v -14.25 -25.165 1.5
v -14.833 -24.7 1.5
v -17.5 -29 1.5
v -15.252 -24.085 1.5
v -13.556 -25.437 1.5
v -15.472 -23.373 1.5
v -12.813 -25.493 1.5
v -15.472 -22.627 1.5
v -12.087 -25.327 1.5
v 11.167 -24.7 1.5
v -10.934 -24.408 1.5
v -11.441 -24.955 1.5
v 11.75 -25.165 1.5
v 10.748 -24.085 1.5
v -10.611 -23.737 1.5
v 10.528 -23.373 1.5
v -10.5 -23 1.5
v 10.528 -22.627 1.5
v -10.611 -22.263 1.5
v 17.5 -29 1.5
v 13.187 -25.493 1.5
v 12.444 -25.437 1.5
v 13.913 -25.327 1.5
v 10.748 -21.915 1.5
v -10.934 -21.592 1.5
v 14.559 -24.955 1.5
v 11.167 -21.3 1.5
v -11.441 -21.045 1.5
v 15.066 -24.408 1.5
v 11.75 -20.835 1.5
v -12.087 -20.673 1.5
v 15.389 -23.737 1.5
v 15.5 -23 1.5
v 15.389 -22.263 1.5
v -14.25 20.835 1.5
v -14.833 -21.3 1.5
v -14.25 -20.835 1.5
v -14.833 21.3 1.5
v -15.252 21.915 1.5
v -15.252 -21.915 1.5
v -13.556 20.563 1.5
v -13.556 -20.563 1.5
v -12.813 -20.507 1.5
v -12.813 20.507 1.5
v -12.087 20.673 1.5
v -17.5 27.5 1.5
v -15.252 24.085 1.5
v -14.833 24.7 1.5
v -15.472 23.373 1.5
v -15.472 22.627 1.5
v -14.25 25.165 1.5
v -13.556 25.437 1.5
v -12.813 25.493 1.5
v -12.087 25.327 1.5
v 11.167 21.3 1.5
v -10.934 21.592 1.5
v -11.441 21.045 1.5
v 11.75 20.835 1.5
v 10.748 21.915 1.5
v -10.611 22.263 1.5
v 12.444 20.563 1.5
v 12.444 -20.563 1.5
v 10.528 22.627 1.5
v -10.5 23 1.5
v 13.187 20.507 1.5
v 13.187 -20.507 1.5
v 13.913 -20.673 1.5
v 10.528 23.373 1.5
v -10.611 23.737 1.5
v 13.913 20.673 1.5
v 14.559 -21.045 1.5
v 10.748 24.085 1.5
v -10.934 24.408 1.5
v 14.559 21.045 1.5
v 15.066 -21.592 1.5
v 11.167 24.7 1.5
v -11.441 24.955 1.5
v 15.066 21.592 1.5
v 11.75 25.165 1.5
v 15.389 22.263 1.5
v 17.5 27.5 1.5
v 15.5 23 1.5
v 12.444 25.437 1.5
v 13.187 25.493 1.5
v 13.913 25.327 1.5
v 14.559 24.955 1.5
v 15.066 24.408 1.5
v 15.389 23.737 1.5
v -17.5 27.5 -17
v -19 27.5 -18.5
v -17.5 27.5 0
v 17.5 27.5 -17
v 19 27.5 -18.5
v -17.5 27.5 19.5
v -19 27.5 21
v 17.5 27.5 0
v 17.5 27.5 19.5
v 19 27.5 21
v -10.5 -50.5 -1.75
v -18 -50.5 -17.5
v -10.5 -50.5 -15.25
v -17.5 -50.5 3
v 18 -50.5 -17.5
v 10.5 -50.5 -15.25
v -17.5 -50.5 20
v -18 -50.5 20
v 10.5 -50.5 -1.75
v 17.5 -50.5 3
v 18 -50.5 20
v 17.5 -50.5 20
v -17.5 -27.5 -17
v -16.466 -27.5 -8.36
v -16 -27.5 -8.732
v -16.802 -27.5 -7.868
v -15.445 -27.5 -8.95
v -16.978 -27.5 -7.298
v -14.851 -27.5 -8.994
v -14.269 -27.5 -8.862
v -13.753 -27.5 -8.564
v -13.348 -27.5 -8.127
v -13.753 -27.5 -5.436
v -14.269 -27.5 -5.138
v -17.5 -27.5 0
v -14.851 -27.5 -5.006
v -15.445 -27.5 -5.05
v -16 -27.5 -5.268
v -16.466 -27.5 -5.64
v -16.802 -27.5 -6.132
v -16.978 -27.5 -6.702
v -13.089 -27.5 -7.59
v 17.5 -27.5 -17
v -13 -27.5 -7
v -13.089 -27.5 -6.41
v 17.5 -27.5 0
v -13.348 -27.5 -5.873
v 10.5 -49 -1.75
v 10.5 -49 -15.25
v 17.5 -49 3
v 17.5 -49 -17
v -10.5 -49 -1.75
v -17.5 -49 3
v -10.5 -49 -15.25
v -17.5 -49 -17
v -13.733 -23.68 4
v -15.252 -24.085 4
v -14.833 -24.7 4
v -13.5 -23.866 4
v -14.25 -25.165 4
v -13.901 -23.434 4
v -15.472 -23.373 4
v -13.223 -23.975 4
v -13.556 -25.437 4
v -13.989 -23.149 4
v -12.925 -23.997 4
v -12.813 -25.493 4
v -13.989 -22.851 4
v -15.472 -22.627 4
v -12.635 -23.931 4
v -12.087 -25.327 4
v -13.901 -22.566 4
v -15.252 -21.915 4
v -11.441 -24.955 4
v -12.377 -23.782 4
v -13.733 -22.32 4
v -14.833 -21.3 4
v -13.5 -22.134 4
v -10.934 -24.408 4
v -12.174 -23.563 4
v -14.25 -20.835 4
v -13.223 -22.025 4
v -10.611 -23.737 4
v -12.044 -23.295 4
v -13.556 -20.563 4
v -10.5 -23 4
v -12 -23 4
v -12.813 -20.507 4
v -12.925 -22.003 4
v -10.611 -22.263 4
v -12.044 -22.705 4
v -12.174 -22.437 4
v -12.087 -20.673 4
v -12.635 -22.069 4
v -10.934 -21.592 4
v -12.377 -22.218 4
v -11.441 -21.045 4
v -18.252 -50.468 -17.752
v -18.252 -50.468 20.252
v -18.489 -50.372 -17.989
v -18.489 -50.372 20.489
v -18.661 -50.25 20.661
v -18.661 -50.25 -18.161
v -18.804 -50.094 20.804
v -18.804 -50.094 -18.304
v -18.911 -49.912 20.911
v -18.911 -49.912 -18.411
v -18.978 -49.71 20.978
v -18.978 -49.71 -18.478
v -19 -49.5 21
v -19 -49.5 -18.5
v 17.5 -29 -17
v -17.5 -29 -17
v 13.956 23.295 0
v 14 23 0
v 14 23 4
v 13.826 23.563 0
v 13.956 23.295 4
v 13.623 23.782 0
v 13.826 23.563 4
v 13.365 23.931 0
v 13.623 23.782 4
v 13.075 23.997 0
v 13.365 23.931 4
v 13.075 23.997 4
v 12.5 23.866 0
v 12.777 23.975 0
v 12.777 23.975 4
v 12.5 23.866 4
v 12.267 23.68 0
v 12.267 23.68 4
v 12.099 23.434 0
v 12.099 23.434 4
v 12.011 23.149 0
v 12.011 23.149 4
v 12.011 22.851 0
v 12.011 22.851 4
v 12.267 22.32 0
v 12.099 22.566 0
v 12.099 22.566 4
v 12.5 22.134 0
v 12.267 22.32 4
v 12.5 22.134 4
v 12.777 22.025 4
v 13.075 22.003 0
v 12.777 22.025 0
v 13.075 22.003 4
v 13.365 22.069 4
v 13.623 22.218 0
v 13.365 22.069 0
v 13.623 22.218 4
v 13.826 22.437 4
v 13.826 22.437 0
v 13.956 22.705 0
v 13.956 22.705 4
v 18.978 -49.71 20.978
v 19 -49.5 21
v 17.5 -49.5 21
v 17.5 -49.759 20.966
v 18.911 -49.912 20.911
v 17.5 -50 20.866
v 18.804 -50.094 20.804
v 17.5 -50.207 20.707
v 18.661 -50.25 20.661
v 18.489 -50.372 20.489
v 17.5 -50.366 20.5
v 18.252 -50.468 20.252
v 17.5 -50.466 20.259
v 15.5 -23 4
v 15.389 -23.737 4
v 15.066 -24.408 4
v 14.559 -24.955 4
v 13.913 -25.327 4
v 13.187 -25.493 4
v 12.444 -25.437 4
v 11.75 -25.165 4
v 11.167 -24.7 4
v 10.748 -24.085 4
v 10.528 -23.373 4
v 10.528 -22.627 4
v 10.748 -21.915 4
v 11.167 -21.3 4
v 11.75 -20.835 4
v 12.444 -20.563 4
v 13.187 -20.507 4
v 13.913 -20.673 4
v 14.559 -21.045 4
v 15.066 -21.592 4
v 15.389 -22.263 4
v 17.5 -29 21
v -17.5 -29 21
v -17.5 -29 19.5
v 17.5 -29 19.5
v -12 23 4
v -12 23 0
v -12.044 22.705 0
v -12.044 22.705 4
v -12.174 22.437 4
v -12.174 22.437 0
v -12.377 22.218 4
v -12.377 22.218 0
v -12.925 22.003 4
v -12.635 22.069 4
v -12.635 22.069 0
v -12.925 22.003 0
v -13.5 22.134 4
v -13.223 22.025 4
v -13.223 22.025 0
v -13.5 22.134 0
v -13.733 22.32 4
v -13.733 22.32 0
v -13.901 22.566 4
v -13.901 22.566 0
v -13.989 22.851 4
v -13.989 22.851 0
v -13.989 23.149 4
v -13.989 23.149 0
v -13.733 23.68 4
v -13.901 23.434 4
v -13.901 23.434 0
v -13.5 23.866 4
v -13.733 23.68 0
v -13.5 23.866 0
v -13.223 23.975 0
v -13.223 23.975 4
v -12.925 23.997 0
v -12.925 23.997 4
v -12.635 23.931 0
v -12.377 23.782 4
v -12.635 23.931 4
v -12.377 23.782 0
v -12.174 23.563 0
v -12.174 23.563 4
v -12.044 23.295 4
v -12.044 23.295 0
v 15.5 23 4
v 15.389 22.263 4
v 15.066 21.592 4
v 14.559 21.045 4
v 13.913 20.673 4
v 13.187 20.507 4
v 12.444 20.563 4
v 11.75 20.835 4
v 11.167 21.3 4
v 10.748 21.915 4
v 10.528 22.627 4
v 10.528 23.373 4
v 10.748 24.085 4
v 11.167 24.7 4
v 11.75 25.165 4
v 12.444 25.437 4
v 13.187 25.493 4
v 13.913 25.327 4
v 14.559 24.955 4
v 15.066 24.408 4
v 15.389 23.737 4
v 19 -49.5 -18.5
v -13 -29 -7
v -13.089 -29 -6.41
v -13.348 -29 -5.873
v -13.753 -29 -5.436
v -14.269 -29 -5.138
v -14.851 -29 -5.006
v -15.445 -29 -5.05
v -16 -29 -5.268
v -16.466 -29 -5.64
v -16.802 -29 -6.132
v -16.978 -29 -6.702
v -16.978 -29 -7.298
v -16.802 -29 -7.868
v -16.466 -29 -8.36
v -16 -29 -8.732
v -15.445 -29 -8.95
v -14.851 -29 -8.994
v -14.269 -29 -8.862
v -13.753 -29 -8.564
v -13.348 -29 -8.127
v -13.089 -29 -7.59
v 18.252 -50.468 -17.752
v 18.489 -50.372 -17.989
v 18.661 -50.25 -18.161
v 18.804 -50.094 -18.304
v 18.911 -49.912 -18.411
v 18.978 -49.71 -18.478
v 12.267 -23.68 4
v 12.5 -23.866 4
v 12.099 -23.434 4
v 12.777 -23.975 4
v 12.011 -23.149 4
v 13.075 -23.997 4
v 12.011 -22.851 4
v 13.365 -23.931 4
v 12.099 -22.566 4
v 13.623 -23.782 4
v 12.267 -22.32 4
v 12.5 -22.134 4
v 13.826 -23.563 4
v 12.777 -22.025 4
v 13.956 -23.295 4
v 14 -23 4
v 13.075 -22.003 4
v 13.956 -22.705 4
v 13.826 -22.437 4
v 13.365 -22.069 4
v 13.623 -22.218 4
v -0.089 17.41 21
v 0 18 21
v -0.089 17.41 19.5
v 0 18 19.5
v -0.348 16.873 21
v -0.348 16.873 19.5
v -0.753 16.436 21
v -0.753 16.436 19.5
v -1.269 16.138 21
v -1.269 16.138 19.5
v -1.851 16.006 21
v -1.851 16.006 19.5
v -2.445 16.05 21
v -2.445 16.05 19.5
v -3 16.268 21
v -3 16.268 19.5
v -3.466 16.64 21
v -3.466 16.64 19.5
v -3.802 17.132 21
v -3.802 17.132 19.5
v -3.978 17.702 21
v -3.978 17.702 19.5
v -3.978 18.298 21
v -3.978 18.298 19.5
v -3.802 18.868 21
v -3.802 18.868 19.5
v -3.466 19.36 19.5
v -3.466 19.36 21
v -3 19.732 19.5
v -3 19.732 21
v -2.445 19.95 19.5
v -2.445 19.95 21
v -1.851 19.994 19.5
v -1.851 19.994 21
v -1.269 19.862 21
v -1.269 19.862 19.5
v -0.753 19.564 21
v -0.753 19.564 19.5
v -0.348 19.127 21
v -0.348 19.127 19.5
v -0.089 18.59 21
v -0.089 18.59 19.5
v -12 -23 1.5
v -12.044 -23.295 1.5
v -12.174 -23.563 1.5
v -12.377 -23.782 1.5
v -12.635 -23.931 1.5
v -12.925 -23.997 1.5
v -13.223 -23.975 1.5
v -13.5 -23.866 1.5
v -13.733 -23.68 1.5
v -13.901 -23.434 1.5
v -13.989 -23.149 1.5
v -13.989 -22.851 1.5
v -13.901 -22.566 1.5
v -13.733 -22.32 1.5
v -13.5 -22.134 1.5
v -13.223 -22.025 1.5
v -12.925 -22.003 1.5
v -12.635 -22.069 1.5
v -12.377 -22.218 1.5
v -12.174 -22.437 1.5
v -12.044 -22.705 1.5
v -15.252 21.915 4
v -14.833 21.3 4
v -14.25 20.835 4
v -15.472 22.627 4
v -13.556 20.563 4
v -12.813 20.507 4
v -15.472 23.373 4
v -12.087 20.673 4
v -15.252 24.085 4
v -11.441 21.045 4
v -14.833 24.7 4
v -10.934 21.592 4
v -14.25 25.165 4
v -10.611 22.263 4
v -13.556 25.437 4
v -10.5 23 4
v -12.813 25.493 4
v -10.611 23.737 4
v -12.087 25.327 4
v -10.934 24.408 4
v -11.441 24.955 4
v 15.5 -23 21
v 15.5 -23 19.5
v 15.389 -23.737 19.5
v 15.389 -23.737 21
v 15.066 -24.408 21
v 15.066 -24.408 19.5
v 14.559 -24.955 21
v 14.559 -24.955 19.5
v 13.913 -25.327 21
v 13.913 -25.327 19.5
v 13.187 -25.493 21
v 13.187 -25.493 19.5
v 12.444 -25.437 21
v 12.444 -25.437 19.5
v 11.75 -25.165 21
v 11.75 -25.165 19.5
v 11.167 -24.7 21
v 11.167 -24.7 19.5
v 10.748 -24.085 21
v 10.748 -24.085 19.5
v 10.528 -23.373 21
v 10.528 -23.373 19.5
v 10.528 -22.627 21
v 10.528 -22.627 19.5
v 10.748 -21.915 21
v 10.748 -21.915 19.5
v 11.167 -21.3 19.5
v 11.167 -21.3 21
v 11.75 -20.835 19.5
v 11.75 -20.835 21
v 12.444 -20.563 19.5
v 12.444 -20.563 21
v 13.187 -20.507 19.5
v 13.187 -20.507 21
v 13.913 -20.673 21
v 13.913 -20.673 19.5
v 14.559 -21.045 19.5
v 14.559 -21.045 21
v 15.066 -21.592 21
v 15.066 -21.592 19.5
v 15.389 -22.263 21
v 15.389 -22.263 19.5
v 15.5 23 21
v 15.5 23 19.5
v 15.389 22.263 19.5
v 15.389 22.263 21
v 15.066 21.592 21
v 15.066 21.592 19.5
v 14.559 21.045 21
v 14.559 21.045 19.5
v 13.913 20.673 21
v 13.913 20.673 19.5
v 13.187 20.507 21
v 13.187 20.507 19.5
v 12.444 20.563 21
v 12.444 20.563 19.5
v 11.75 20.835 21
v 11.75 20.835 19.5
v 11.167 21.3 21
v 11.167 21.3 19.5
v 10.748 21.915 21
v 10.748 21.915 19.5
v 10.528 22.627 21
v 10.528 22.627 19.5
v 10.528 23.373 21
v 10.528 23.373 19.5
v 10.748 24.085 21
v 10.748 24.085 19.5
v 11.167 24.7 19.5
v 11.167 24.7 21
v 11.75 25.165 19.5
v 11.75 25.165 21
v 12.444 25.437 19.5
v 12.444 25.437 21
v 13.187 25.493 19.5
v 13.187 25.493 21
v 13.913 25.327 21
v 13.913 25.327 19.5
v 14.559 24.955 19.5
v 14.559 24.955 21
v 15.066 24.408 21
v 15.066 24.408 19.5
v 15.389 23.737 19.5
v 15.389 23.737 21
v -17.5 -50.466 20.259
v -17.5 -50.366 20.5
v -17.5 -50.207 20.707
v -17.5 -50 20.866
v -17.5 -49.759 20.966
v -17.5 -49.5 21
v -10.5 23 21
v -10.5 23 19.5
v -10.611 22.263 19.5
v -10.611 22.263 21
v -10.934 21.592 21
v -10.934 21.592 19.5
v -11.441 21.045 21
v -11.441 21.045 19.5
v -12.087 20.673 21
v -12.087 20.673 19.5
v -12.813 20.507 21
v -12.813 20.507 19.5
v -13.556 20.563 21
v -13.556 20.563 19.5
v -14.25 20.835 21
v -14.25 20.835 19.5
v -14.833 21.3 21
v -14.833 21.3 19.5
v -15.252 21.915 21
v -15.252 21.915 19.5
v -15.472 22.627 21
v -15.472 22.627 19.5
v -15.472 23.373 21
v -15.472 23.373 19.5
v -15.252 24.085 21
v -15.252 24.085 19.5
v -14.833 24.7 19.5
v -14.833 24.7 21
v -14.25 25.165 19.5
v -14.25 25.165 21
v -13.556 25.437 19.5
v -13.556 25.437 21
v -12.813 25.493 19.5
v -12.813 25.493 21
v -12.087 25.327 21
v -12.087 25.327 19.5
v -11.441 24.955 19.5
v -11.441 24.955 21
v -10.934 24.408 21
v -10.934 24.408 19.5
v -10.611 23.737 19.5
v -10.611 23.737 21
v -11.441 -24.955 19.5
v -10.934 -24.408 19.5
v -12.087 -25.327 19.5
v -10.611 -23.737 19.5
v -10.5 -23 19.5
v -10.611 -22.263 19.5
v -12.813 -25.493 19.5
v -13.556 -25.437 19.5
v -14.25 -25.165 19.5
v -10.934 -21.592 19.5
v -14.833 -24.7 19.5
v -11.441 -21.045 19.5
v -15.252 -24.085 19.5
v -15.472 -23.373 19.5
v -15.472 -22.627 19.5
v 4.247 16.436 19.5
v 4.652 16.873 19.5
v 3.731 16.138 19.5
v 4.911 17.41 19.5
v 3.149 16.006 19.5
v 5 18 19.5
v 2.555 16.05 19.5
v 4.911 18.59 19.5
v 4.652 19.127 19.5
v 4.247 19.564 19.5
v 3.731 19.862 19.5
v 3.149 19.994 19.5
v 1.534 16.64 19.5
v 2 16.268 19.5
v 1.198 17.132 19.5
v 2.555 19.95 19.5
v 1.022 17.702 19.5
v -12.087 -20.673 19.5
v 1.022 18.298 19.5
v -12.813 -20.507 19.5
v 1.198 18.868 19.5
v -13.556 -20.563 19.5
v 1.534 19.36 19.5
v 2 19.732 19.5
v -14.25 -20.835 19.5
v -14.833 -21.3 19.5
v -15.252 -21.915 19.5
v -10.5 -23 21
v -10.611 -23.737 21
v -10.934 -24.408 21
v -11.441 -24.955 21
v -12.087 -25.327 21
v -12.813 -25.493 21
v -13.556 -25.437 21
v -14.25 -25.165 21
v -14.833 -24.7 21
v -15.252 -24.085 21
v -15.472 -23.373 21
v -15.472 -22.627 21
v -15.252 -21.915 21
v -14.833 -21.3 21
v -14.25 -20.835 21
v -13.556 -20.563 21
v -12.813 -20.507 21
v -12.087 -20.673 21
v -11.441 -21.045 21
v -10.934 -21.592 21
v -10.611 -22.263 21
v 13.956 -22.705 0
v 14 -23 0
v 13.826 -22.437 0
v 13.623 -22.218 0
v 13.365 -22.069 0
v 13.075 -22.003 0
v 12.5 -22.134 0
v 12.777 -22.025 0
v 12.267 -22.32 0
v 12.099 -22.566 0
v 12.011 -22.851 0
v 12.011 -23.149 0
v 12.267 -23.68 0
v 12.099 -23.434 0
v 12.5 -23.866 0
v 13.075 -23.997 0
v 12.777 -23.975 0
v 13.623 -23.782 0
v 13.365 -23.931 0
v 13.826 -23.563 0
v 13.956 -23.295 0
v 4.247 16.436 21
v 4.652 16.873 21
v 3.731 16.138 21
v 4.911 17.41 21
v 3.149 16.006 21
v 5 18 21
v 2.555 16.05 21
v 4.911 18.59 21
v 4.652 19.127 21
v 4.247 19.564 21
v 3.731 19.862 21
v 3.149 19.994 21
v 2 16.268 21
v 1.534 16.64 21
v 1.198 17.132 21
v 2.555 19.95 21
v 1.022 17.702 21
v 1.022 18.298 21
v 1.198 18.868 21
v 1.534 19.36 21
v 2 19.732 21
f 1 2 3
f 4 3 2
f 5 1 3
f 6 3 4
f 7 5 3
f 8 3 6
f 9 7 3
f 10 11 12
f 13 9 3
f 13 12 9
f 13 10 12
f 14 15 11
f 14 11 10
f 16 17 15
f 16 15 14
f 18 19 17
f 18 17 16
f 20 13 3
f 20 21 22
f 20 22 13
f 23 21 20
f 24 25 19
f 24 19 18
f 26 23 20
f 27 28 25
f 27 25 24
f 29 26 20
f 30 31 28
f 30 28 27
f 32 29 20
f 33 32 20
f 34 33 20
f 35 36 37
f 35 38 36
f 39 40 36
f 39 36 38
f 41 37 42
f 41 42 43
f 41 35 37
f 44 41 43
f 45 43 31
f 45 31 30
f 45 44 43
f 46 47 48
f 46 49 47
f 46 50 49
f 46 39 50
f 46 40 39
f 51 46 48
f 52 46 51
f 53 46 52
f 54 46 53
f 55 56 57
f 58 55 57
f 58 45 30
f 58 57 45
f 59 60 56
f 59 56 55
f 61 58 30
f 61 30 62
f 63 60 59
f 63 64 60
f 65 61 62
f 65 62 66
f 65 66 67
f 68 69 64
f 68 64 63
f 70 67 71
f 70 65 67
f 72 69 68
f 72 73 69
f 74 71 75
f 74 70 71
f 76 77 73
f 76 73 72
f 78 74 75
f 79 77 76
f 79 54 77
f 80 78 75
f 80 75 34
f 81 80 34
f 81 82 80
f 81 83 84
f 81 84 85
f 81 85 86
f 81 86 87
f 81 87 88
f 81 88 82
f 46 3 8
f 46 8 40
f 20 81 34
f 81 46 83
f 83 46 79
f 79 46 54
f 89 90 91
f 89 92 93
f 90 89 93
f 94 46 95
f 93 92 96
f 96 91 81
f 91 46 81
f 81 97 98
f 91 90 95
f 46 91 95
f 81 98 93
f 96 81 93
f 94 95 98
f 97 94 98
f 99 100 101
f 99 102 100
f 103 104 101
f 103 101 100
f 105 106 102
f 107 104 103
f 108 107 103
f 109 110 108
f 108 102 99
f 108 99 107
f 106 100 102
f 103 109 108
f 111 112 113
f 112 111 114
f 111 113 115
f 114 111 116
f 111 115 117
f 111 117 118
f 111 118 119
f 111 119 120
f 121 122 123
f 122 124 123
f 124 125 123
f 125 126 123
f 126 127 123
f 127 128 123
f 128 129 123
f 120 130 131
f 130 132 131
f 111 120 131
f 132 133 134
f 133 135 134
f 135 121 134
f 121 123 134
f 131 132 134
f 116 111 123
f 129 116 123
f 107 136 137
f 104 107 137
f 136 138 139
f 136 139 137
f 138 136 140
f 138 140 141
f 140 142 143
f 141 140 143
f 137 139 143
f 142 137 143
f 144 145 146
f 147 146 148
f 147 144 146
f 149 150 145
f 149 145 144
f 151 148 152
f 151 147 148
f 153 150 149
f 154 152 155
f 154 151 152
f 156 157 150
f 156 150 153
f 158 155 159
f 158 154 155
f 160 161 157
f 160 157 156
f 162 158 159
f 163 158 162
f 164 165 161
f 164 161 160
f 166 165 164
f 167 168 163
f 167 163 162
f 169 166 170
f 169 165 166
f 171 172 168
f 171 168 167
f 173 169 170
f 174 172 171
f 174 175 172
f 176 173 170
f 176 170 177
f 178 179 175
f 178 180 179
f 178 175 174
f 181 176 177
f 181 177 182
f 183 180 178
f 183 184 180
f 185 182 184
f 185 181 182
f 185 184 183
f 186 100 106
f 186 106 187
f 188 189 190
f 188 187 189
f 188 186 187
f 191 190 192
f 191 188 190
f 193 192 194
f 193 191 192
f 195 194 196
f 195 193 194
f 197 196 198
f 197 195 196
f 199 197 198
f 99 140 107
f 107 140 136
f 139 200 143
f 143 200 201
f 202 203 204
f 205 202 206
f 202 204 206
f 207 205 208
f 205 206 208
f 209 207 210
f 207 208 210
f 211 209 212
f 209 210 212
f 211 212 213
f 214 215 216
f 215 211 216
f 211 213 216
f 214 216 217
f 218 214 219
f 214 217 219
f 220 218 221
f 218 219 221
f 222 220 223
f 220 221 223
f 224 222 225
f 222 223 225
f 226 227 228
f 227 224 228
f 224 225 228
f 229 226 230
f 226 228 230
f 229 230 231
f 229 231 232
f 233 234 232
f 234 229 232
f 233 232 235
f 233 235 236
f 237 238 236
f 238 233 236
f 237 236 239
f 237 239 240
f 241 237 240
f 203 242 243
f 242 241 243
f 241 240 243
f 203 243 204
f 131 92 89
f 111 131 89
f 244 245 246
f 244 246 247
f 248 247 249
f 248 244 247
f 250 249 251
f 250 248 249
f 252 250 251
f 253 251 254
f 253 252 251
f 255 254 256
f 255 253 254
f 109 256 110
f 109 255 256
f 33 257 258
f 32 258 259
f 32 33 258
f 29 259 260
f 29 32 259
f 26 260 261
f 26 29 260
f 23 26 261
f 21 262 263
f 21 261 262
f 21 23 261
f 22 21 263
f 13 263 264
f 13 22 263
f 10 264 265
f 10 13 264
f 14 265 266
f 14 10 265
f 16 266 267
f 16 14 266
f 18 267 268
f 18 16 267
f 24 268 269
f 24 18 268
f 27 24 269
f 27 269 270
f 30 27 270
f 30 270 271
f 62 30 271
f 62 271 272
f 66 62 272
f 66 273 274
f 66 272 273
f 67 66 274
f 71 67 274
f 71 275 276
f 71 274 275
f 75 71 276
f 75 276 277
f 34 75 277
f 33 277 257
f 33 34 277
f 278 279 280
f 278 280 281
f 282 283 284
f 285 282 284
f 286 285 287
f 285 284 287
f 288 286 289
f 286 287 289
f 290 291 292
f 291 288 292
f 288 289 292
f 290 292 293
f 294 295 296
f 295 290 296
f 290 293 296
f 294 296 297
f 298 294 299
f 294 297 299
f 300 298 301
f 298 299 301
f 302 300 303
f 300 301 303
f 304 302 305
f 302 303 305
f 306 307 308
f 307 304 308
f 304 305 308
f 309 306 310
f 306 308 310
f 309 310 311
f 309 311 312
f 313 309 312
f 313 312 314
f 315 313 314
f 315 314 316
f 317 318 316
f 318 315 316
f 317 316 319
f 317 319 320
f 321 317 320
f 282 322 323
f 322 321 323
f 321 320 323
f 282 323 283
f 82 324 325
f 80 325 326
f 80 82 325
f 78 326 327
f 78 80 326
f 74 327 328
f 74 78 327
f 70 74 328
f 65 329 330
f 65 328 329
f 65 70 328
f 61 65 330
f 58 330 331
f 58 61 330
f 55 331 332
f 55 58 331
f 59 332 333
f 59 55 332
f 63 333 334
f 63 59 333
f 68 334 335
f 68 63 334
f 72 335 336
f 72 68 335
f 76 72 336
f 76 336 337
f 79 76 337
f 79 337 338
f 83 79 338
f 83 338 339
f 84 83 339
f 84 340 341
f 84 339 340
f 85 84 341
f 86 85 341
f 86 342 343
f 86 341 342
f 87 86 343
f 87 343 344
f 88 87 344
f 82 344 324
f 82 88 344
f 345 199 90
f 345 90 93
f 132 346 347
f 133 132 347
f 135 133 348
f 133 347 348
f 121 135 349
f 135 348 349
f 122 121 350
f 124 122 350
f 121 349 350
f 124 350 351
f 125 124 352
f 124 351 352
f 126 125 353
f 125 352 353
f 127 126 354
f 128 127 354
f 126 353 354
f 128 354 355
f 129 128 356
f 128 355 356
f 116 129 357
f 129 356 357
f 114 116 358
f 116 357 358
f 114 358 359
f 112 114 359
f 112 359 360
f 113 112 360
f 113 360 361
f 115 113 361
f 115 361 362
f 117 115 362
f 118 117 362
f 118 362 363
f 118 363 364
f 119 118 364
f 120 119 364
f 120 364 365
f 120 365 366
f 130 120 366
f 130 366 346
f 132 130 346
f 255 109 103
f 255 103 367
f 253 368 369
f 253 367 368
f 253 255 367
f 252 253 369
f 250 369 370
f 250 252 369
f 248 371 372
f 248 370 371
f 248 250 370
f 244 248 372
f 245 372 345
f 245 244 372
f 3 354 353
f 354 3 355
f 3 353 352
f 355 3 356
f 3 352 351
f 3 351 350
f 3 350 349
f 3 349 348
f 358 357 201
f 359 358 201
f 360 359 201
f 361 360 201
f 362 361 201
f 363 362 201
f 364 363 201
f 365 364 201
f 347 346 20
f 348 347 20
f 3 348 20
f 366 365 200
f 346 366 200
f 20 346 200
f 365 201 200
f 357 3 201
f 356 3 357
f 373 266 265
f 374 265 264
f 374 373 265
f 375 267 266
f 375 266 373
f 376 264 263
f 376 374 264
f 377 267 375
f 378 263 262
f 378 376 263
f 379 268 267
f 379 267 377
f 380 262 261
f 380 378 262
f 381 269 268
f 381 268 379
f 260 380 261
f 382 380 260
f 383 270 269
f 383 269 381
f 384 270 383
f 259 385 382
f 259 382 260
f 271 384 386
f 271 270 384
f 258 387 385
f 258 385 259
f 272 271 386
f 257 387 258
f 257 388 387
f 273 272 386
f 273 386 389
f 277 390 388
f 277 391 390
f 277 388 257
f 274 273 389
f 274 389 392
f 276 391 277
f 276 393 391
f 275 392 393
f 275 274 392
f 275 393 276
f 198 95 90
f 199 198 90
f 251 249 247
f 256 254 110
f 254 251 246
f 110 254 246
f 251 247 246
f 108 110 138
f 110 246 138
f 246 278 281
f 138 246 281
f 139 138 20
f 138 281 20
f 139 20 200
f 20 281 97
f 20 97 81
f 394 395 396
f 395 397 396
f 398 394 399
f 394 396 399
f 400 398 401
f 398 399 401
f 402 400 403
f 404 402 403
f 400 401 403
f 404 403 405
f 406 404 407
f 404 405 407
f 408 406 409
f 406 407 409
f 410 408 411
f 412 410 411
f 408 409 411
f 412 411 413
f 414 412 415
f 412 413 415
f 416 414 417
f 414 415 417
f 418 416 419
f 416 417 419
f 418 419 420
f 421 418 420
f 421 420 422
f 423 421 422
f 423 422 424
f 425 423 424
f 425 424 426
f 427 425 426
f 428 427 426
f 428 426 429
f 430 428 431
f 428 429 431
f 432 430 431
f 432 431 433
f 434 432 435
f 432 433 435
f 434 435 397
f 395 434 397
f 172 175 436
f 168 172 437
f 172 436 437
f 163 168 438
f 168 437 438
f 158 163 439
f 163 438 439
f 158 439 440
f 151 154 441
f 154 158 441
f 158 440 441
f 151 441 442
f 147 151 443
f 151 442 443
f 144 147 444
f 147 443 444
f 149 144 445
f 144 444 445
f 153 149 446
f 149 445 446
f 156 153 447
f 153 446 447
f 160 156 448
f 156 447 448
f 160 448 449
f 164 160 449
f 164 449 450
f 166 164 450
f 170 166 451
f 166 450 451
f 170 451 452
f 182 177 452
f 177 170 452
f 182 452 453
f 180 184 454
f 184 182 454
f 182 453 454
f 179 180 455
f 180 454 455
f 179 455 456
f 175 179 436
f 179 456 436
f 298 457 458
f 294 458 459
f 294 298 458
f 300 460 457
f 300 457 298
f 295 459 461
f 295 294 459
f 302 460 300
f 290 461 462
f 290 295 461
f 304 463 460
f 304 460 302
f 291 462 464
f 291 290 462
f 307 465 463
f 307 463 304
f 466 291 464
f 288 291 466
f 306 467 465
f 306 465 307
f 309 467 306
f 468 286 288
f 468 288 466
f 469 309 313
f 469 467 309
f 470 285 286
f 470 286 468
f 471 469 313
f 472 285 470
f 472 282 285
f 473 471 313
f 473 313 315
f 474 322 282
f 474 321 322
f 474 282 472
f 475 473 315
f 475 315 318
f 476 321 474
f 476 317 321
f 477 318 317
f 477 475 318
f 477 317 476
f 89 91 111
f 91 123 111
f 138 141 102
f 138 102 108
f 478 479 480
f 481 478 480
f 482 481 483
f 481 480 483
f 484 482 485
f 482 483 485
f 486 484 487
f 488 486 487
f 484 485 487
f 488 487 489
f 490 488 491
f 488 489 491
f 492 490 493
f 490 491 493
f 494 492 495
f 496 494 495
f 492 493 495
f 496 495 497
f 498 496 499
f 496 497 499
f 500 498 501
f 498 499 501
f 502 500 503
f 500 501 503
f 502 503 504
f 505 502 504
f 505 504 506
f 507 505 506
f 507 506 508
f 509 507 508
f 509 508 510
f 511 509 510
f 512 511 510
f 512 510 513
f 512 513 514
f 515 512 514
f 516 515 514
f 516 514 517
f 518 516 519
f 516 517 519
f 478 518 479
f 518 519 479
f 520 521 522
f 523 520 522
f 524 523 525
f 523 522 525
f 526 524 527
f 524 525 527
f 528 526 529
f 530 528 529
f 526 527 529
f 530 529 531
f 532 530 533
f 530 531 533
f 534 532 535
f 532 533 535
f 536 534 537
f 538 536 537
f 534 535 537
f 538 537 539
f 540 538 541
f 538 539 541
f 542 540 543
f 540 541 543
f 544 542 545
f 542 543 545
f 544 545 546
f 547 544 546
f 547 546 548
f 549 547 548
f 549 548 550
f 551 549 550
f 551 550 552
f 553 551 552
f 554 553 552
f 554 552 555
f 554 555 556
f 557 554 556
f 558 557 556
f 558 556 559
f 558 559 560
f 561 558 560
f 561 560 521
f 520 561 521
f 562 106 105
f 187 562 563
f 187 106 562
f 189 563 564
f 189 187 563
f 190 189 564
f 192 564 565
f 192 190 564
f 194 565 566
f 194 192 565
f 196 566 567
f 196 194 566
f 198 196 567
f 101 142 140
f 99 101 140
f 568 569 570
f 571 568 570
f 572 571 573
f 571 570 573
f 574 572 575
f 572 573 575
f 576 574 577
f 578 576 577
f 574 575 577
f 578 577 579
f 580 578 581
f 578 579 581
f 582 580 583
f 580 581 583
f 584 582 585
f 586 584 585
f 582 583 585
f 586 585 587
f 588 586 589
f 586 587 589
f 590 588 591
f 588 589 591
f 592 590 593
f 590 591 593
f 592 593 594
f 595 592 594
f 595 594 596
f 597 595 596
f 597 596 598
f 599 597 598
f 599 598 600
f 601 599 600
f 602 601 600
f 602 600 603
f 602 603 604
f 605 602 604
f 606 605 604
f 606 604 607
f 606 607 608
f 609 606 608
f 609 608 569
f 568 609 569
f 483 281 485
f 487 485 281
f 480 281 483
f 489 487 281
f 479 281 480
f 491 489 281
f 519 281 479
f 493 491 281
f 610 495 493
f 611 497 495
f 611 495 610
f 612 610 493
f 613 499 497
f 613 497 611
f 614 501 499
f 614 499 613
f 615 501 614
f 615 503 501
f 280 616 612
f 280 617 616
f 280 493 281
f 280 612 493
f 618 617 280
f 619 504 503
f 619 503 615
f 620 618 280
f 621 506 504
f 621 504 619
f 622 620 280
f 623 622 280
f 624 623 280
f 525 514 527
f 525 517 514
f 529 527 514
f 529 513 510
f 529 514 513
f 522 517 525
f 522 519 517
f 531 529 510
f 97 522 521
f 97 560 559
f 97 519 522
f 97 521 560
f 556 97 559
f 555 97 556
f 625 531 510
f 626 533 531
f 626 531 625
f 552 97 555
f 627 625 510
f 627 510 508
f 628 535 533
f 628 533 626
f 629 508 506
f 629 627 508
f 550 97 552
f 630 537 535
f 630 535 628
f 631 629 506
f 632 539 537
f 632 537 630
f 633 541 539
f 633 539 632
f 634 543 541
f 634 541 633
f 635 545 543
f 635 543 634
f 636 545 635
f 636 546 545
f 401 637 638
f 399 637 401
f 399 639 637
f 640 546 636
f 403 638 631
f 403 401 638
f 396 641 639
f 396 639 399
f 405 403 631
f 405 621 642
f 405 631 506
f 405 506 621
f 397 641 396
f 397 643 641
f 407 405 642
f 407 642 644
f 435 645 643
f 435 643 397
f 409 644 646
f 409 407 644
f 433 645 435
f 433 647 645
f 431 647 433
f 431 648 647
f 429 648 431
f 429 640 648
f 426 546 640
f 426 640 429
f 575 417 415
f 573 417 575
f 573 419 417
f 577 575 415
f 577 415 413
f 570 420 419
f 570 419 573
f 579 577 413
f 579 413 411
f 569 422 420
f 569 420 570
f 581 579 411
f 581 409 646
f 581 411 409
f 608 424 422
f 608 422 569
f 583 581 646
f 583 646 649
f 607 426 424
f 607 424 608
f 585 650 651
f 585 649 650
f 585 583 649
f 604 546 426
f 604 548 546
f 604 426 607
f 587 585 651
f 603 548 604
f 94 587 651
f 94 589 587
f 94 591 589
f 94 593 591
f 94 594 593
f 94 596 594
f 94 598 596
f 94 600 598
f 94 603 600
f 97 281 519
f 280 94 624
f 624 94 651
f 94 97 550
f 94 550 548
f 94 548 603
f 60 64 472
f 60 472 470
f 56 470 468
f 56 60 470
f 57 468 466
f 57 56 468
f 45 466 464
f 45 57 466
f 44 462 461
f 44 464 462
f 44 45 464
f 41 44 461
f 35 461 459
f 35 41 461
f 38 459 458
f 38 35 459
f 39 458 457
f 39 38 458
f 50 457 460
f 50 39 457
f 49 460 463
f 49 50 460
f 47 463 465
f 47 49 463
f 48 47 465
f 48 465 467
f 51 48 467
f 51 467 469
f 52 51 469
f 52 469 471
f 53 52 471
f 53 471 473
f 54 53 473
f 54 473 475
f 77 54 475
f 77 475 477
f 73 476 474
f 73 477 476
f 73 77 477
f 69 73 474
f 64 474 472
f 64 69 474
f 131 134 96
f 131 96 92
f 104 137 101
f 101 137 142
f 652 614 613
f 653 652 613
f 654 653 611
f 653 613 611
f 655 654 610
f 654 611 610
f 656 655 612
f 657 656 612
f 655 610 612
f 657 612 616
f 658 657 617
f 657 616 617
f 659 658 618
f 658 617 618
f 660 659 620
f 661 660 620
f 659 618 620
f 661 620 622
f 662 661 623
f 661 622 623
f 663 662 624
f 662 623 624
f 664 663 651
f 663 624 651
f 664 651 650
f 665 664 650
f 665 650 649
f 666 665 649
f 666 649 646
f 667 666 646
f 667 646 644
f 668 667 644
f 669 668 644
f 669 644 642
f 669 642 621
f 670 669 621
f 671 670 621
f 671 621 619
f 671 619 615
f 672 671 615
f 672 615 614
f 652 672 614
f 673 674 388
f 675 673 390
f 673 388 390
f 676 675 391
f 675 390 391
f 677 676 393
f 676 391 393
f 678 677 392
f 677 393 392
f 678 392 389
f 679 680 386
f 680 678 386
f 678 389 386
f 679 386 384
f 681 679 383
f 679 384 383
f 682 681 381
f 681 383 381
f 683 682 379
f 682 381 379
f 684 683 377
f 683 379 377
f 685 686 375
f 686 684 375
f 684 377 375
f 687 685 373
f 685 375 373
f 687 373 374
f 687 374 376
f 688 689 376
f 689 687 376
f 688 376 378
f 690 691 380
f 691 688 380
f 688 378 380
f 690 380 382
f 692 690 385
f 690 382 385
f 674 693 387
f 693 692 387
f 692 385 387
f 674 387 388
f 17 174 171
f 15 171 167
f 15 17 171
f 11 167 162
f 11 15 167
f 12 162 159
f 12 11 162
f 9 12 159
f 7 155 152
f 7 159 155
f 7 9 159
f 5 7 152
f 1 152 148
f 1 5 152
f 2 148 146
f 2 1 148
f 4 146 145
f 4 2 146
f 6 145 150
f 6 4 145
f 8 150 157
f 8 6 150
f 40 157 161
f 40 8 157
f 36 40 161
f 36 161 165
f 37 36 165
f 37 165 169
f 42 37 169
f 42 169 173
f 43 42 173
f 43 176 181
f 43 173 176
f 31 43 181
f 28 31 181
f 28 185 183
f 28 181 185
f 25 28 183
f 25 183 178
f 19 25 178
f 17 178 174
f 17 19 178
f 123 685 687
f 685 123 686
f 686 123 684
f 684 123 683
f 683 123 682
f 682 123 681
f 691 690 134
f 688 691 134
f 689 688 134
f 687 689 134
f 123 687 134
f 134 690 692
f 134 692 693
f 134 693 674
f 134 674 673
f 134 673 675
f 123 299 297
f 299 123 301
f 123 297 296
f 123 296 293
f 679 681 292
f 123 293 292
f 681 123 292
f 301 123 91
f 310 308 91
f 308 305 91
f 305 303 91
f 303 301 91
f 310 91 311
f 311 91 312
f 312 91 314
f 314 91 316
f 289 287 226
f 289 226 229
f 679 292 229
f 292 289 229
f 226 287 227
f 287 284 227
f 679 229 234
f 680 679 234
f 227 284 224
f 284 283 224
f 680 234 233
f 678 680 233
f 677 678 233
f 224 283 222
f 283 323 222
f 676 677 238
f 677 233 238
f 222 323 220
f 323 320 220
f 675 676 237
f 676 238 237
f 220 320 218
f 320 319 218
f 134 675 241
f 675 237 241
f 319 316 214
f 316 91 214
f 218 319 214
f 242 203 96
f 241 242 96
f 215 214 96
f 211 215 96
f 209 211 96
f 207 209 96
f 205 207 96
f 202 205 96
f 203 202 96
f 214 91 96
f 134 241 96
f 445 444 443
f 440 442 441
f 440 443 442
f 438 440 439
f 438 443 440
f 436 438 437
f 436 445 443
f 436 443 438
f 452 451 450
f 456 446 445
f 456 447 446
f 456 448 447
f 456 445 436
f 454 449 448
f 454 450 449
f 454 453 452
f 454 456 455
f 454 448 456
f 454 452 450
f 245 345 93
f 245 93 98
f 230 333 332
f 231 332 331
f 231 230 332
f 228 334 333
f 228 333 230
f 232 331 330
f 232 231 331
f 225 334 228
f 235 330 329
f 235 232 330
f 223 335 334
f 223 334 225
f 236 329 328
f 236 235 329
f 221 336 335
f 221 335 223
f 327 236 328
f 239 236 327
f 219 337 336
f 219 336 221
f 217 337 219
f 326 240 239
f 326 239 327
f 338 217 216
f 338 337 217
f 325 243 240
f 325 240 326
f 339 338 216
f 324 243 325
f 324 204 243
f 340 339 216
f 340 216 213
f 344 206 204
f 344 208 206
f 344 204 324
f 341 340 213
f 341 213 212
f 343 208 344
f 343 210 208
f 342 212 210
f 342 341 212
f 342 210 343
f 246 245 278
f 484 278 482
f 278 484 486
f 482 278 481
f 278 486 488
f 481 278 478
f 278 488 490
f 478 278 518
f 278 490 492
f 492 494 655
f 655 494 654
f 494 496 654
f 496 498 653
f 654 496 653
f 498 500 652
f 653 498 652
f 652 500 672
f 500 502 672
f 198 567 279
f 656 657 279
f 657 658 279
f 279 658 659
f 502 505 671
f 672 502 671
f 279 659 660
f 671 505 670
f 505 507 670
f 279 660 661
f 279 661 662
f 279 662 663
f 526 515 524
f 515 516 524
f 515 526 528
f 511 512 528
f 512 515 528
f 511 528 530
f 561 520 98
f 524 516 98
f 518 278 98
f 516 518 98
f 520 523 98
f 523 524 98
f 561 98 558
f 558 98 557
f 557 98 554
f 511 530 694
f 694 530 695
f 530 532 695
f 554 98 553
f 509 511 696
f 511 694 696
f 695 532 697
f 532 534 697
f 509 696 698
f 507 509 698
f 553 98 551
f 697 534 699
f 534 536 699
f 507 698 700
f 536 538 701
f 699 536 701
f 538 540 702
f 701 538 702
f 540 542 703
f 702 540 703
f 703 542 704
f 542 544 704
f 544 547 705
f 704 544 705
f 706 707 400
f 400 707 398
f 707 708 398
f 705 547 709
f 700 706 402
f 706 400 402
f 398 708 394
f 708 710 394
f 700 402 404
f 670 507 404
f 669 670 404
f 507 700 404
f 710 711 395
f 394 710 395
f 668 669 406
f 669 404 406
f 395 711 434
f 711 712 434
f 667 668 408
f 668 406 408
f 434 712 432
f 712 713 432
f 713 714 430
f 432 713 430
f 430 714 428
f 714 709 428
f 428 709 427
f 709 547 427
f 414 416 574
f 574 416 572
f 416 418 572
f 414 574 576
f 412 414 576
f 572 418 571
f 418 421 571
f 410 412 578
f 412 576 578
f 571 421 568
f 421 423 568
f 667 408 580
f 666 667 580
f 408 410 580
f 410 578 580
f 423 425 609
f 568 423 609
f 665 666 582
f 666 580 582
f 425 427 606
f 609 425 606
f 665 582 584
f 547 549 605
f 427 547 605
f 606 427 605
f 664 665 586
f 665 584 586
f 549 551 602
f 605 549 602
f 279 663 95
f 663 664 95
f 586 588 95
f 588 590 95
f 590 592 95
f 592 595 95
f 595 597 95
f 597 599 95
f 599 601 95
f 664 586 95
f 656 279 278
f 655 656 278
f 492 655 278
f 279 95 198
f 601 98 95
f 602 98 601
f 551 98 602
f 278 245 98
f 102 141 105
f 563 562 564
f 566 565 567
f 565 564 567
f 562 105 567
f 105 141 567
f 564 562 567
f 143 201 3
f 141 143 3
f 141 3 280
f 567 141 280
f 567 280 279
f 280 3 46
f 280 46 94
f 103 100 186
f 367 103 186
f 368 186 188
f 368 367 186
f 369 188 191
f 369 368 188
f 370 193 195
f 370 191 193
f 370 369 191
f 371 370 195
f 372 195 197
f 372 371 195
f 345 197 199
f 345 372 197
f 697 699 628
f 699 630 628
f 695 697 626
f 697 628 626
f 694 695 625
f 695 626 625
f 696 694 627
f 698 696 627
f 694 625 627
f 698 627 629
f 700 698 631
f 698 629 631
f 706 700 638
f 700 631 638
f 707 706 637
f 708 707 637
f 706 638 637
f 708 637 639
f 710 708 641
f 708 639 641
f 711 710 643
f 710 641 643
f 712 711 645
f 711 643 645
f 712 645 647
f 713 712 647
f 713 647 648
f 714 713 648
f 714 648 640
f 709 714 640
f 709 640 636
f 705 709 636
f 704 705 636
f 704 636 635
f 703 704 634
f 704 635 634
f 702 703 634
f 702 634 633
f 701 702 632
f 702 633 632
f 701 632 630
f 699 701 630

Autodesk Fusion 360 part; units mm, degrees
sketch "Sketch1" plane through (0, 0, 0) normal (0, 0, 1) x (1, 0, 0)
  line L0 (0, 50) -> (0, -40) construction
  line L1 (-50, 0) -> (45, 0) construction
  line L2 (-17.5, 27.5) -> (17.5, 27.5)
  line L3 (17.5, 27.5) -> (17.5, -27.5)
  line L4 (17.5, -27.5) -> (-17.5, -27.5)
  line L5 (-17.5, -27.5) -> (-17.5, 27.5)
  line L6 (-13, 23) -> (13, 23) construction
  line L7 (13, 23) -> (13, -23) construction
  line L8 (13, -23) -> (-13, -23) construction
  line L9 (-13, -23) -> (-13, 23) construction
  circle A0 centre (-13, 23) radius 2.5
  circle A1 centre (-13, 23) radius 1
  line L10 (-13, 23) -> (-2, 23) construction
  line L11 (-2, 23) -> (-2, 18) construction
  line L12 (-2, 18) -> (-13, 18) construction
  line L13 (-13, 18) -> (-13, 23) construction
  circle A2 centre (-2, 18) radius 2
  dimension "d1" = 35
  dimension "d2" = 55
  dimension "d3" = 17.5
  dimension "d4" = 27.5
  dimension "d5" = 26
  dimension "d6" = 46
  dimension "d7" = 13
  dimension "d8" = 23
  dimension "d9" = 5
  dimension "d10" = 2
  dimension "d63" = 11
  dimension "d64" = 5
  dimension "d65" = 4
extrude "Extrude1" add sketch "Sketch1" along normal blind 4 contours A0 makes body 1
pattern_linear "R-Pattern1" count 2 spacing 46 along (0, -1, 0) count 2 spacing 26 along (1, 0, 0) of bodies 1 makes body 2 at (-10.5031, -23.1246, 2.6667) makes body 3 at (15.4969, 22.8754, 2.6667) makes body 4 at (15.4969, -23.1246, 2.6667)
extrude "Extrude2" add sketch "Sketch1" along normal blind 1.5 separate body contours L2 L3 L4 L5 | A2 makes body 5
sketch "Sketch2" plane through (0, -27.5, 0) normal (0, -1, 0) x (1, 0, 0)
  line L0 (-17.5, 0) -> (17.5, 0)
  line L1 (17.5, 0) -> (17.5, 1.5)
  line L2 (17.5, 1.5) -> (-17.5, 1.5)
  line L3 (-17.5, 1.5) -> (-17.5, 0)
  line L4 (-17.5, 0) -> (17.5, 0)
  line L5 (17.5, 0) -> (17.5, 19.5)
  line L6 (17.5, 19.5) -> (-17.5, 19.5)
  line L7 (-17.5, 19.5) -> (-17.5, 0)
  line L8 (-19, 21) -> (19, 21)
  line L9 (19, 21) -> (19, 0)
  line L10 (19, 0) -> (-19, 0)
  line L11 (-19, 0) -> (-19, 21)
  line L12 (17.5, 0) -> (-17.5, 0)
  line L13 (-17.5, 0) -> (17.5, 0)
  line L14 (17.5, 0) -> (17.5, -17)
  line L15 (17.5, -17) -> (-17.5, -17)
  line L16 (-17.5, -17) -> (-17.5, 0)
  line L17 (-19, 0) -> (19, 0)
  line L18 (19, 0) -> (19, -18.5)
  line L19 (19, -18.5) -> (-19, -18.5)
  line L20 (-19, -18.5) -> (-19, 0)
  line L21 (-20.5, -19.25) -> (20.5, -19.25)
  line L22 (20.5, -19.25) -> (20.5, 21.75)
  line L23 (20.5, 21.75) -> (-20.5, 21.75)
  line L24 (-20.5, 21.75) -> (-20.5, -19.25)
  line L25 (-19, -17.75) -> (19, -17.75)
  line L26 (19, -17.75) -> (19, 20.25)
  line L27 (19, 20.25) -> (-19, 20.25)
  line L28 (-19, 20.25) -> (-19, -17.75)
  line L29 (-21.5, -20.25) -> (21.5, -20.25)
  line L30 (21.5, -20.25) -> (21.5, 22.75)
  line L31 (21.5, 22.75) -> (-21.5, 22.75)
  line L32 (-21.5, 22.75) -> (-21.5, -20.25)
  line L33 (-18.5, 15) -> (-18.5, 26)
  line L34 (14.5, 15) -> (14.5, 25)
  line L35 (-23.5, -22.25) -> (23.5, -22.25)
  line L36 (23.5, -22.25) -> (23.5, 24.75)
  line L37 (23.5, 24.75) -> (-23.5, 24.75)
  line L38 (-23.5, 24.75) -> (-23.5, -22.25)
  line L39 (-14.5, 15) -> (-14.5, 32)
  dimension "d19" = 35
  dimension "d20" = 19.5
  dimension "d22" = 1.5
  dimension "d23" = 1.5
  dimension "d24" = 1.5
  dimension "d25" = 17
  dimension "d83" = 1.5
  dimension "d86" = 3
  dimension "d88" = 2.25
  dimension "d90" = 2.25
  dimension "d91" = 1.5
  dimension "d92" = 1.5
  dimension "d93" = 1.5
  dimension "d94" = 1.5
  dimension "d100" = 1
  dimension "d101" = 1
  dimension "d102" = 1
  dimension "d103" = 1
  dimension "d104" = 2
  dimension "d105" = 6
  dimension "d112" = 2
  dimension "d113" = 2
  dimension "d114" = 2
  dimension "d115" = 2
  dimension "d118" = 3
  dimension "d119" = 3
extrude "Extrude3" add sketch "Sketch2" against normal blind 55 contours L3 L6 L7 L10 L11 L17 L27 L28 L39 | L10 L14 L15 L16 L17 L18 L20 L25 L26 L28 | L1 L5 L6 L9 L10 L17 L26 L27 L34 | L8 L11 L27 L33 | L18 L19 L20 L25 | L8 L9 L27 L34 | L6 L27 L34 L39 | L8 L27 L33 L39 | L8 L27 L34 L39 bodies 5
extrude "Extrude4" add sketch "Sketch2" along normal blind 1.5 separate body contours L0 L4 L10 L12 L13 L14 L15 L16 L17 makes body 6
extrude "Extrude5" add sketch "Sketch2" along normal blind 21.5 contours L10 L14 L15 L16 L17 L18 L20 L25 L26 L28 | L18 L19 L20 L25 bodies 5 6
sketch "Sketch3" plane through (0, -49, 0) normal (0, -1, 0) x (1, 0, 0)
  line L0 (17.5, 0) -> (17.5, -17)
  line L1 (17.5, -17) -> (-17.5, -17)
  line L2 (-17.5, -17) -> (-17.5, 0)
  line L3 (-17.5, 0) -> (-19, 0)
  line L4 (-19, 0) -> (-19, -18.5)
  line L5 (-19, -18.5) -> (19, -18.5)
  line L6 (19, -18.5) -> (19, 0)
  line L7 (19, 0) -> (17.5, 0)
  line L8 (-19, 0) -> (19, 0)
  line L9 (19, 0) -> (19, -18.5)
  line L10 (19, -18.5) -> (-19, -18.5)
  line L11 (-19, -18.5) -> (-19, 0)
  line L12 (-46.8165, -8.5) -> (11.8165, -8.5) construction
  line L13 (-17.5, -17) -> (-17.5, 0) construction
  line L14 (0, -10.2369) -> (0, -23.7631) construction
  line L15 (17.5, -17) -> (-17.5, -17) construction
  line L16 (-10.5, -1.75) -> (10.5, -1.75)
  line L17 (10.5, -1.75) -> (10.5, -15.25)
  line L18 (10.5, -15.25) -> (-10.5, -15.25)
  line L19 (-10.5, -15.25) -> (-10.5, -1.75)
  dimension "d32" = 21
  dimension "d33" = 13.5
  dimension "d34" = 10.5
  dimension "d35" = 6.75
extrude "Extrude6" add sketch "Sketch3" along normal blind 1.5 separate body makes body 7
sketch "Sketch4" plane through (0, 0, 4) normal (0, 0, 1) x (1, 0, 0)
  circle A0 centre (-13, 23) radius 1
  circle A1 centre (-13, 23) radius 2.5
extrude "Extrude8" add sketch "Sketch4" along normal blind 20 separate body contours A0 | A1 makes body 8
pattern_linear "R-Pattern2" count 2 spacing 46 along (0, -1, 0) count 2 spacing 26 along (1, 0, 0) of bodies 8 makes body 9 at (-10.5031, -23.1246, 17.3333) makes body 10 at (15.4969, 22.8754, 17.3333) makes body 11 at (15.4969, -23.1246, 17.3333)
combine "Combine1" operation cut target body 5 tool bodies 11 10 9 8
sketch "Sketch5" plane through (0, -27.5, 0) normal (0, -1, 0) x (1, 0, 0)
  line L0 (-19, 0) -> (-17.5, 0)
  line L1 (-17.5, 0) -> (-17.5, 21)
  line L2 (-17.5, 21) -> (-19, 21)
  line L3 (-19, 21) -> (-19, 0)
  line L4 (-19, 21) -> (19, 21)
  line L5 (17.5, 0) -> (19, 0)
  line L6 (19, 0) -> (19, 21)
  line L7 (19, 21) -> (17.5, 21)
  line L8 (17.5, 21) -> (17.5, 0)
  point P0 (-19, 0)
  point P1 (17.5, 0)
extrude "Extrude9" add sketch "Sketch5" along normal blind 23 bodies 7 5
sketch "Sketch6" plane through (0, 0, 0) normal (0, 0, 1) x (1, 0, 0)
  line L0 (-17.5, -27.5) -> (-17.5, -29)
  line L1 (-17.5, -29) -> (17.5, -29)
  line L2 (17.5, -29) -> (17.5, -27.5)
  line L3 (17.5, -27.5) -> (-17.5, -27.5)
extrude "Extrude10" add sketch "Sketch6" along normal blind 1.5 bodies 7
sketch "Sketch7" plane through (0, -29, 0) normal (0, -1, 0) x (1, 0, 0)
  line L0 (-17.5, -17) -> (17.5, -17)
  line L1 (17.5, -17) -> (17.5, 1.5)
  line L2 (17.5, 1.5) -> (-17.5, 1.5)
  line L3 (-17.5, 1.5) -> (-17.5, -17)
  circle A0 centre (-15, -7) radius 2
  dimension "d50" = 4
extrude "Extrude11" cut sketch "Sketch7" against normal blind 3 contours A0 bodies 7
sketch "Sketch8" plane through (0, 0, 0) normal (0, 0, 1) x (1, 0, 0)
  line L0 (-17.5, -49) -> (-17.5, -50.5)
  line L1 (-17.5, -50.5) -> (17.5, -50.5)
  line L2 (17.5, -50.5) -> (17.5, -49)
  line L3 (17.5, -49) -> (-17.5, -49)
extrude "Extrude12" add sketch "Sketch8" along normal blind 3 bodies 7
extrude "Extrude13" add sketch "Sketch2" along normal blind 1.5 contours L3 L6 L7 L10 L11 L17 L27 L28 L39 | L1 L5 L6 L9 L10 L17 L26 L27 L34 | L8 L11 L27 L33 | L8 L9 L27 L34 | L6 L27 L34 L39 | L8 L27 L33 L39 | L8 L27 L34 L39 bodies 7
combine "Combine2" operation add target body 7 tool bodies 4 3 2 1
extrude "Extrude14" add 1 faces at (-13.5412, -23.1083, 1.5) along direction (0, 0, -1) blind 1.5 separate body on bodies 7 makes body 12
pattern_linear "R-Pattern3" count 2 spacing 46 along (0, 1, 0) count 2 spacing 26 along (1, 0, 0) of bodies 12 makes body 13 at (-12.0012, 23.0498, 0.5) makes body 14 at (13.9988, -22.9502, 0.5) makes body 15 at (13.9988, 23.0498, 0.5)
combine "Combine3" operation cut target body 7 tool bodies 12 13 14 15
extrude "Extrude15" add sketch "Sketch1" along normal blind 20 separate body contours A2 makes body 16
pattern_linear "R-Pattern4" count 2 spacing 5 along (1, 0, 0) of bodies 16 makes body 17
move_body "Move1" bodies 16 17 to x (1, 0, 0) y (0, 1, 0) z (0, 0, 1) at (0, 0, 5)
combine "Combine4" operation cut target body 7 tool bodies 16 17
fillet "Fillet1" radius 1 2 edges at (-18.25, -50.5, 21) (18.25, -50.5, 21) on bodies 7
fillet "Fillet1" radius 1 1 edges at (0, -50.5, -18.5) on bodies 7
fillet "Fillet1" radius 1 2 edges at (19, -50.5, 1.25) (-19, -50.5, 1.25) on bodies 7
extrude "Extrude23" add sketch "Sketch2" along normal blind 10 separate body contours L8 L9 L11 L18 L19 L20 L21 L22 L23 L24 L26 L28 L33 L34 | L8 L11 L27 L33 | L18 L19 L20 L25 | L8 L9 L27 L34 makes body 18
extrude "Extrude24" add sketch "Sketch2" against normal blind 3 contours L8 L9 L11 L18 L19 L20 L21 L22 L23 L24 L26 L28 L33 L34 | L8 L11 L27 L33 | L18 L19 L20 L25 | L8 L9 L27 L34 bodies 18
extrude "Extrude25" add sketch "Sketch2" against normal blind 3 contours L21 L22 L23 L24 L29 L30 L31 L32 L33 L34 bodies 18
extrude "Extrude26" add sketch "Sketch2" against normal blind 20 contours L31 L33 L37 L39 | L29 L30 L31 L32 L33 L34 L35 L36 L37 L38 | L31 L34 L37 L39 bodies 18
extrude "Extrude27" cut sketch "Sketch2" against normal blind 15 contours L31 L33 L37 L39 | L31 L34 L37 L39 bodies 18
hidden bodies 18
equation "d3 = d1 / 2"
equation "d4 = d2 / 2"
equation "d7 = d5 / 2"
equation "d8 = d6 / 2"
equation "e = 1.5 mm"
equation "d22 = e"
equation "d23 = e"
equation "d24 = e"
equation "d26 = -d2"
equation "d28 = e"
equation "d30 = 20 mm + e"
equation "d34 = d32 / 2"
equation "d35 = ( d33 / 2 )"
equation "d36 = e"
equation "d46 = 20 mm + 2 * e"
equation "d48 = e"
equation "d55 = e"
equation "d57 = -e"
equation "d83 = e"
equation "L = 41 mm"
equation "e2 = 2 mm"
equation "d86 = ( L - d19 ) / 2"
equation "d88 = ( L - d20 - d25 ) / 2"
equation "d90 = ( L - d20 - d25 ) / 2"
equation "d91 = e"
equation "d92 = e"
equation "d93 = e"
equation "d94 = e"
equation "LB = 43 mm"
equation "d100 = ( LB - L ) / 2"
equation "d101 = ( LB - L ) / 2"
equation "d102 = ( LB - L ) / 2"
equation "d103 = ( LB - L ) / 2"
equation "d112 = e2"
equation "d113 = e2"
equation "d114 = e2"
equation "d115 = e2"
equation "d119 = ( L - d19 ) / 2"
